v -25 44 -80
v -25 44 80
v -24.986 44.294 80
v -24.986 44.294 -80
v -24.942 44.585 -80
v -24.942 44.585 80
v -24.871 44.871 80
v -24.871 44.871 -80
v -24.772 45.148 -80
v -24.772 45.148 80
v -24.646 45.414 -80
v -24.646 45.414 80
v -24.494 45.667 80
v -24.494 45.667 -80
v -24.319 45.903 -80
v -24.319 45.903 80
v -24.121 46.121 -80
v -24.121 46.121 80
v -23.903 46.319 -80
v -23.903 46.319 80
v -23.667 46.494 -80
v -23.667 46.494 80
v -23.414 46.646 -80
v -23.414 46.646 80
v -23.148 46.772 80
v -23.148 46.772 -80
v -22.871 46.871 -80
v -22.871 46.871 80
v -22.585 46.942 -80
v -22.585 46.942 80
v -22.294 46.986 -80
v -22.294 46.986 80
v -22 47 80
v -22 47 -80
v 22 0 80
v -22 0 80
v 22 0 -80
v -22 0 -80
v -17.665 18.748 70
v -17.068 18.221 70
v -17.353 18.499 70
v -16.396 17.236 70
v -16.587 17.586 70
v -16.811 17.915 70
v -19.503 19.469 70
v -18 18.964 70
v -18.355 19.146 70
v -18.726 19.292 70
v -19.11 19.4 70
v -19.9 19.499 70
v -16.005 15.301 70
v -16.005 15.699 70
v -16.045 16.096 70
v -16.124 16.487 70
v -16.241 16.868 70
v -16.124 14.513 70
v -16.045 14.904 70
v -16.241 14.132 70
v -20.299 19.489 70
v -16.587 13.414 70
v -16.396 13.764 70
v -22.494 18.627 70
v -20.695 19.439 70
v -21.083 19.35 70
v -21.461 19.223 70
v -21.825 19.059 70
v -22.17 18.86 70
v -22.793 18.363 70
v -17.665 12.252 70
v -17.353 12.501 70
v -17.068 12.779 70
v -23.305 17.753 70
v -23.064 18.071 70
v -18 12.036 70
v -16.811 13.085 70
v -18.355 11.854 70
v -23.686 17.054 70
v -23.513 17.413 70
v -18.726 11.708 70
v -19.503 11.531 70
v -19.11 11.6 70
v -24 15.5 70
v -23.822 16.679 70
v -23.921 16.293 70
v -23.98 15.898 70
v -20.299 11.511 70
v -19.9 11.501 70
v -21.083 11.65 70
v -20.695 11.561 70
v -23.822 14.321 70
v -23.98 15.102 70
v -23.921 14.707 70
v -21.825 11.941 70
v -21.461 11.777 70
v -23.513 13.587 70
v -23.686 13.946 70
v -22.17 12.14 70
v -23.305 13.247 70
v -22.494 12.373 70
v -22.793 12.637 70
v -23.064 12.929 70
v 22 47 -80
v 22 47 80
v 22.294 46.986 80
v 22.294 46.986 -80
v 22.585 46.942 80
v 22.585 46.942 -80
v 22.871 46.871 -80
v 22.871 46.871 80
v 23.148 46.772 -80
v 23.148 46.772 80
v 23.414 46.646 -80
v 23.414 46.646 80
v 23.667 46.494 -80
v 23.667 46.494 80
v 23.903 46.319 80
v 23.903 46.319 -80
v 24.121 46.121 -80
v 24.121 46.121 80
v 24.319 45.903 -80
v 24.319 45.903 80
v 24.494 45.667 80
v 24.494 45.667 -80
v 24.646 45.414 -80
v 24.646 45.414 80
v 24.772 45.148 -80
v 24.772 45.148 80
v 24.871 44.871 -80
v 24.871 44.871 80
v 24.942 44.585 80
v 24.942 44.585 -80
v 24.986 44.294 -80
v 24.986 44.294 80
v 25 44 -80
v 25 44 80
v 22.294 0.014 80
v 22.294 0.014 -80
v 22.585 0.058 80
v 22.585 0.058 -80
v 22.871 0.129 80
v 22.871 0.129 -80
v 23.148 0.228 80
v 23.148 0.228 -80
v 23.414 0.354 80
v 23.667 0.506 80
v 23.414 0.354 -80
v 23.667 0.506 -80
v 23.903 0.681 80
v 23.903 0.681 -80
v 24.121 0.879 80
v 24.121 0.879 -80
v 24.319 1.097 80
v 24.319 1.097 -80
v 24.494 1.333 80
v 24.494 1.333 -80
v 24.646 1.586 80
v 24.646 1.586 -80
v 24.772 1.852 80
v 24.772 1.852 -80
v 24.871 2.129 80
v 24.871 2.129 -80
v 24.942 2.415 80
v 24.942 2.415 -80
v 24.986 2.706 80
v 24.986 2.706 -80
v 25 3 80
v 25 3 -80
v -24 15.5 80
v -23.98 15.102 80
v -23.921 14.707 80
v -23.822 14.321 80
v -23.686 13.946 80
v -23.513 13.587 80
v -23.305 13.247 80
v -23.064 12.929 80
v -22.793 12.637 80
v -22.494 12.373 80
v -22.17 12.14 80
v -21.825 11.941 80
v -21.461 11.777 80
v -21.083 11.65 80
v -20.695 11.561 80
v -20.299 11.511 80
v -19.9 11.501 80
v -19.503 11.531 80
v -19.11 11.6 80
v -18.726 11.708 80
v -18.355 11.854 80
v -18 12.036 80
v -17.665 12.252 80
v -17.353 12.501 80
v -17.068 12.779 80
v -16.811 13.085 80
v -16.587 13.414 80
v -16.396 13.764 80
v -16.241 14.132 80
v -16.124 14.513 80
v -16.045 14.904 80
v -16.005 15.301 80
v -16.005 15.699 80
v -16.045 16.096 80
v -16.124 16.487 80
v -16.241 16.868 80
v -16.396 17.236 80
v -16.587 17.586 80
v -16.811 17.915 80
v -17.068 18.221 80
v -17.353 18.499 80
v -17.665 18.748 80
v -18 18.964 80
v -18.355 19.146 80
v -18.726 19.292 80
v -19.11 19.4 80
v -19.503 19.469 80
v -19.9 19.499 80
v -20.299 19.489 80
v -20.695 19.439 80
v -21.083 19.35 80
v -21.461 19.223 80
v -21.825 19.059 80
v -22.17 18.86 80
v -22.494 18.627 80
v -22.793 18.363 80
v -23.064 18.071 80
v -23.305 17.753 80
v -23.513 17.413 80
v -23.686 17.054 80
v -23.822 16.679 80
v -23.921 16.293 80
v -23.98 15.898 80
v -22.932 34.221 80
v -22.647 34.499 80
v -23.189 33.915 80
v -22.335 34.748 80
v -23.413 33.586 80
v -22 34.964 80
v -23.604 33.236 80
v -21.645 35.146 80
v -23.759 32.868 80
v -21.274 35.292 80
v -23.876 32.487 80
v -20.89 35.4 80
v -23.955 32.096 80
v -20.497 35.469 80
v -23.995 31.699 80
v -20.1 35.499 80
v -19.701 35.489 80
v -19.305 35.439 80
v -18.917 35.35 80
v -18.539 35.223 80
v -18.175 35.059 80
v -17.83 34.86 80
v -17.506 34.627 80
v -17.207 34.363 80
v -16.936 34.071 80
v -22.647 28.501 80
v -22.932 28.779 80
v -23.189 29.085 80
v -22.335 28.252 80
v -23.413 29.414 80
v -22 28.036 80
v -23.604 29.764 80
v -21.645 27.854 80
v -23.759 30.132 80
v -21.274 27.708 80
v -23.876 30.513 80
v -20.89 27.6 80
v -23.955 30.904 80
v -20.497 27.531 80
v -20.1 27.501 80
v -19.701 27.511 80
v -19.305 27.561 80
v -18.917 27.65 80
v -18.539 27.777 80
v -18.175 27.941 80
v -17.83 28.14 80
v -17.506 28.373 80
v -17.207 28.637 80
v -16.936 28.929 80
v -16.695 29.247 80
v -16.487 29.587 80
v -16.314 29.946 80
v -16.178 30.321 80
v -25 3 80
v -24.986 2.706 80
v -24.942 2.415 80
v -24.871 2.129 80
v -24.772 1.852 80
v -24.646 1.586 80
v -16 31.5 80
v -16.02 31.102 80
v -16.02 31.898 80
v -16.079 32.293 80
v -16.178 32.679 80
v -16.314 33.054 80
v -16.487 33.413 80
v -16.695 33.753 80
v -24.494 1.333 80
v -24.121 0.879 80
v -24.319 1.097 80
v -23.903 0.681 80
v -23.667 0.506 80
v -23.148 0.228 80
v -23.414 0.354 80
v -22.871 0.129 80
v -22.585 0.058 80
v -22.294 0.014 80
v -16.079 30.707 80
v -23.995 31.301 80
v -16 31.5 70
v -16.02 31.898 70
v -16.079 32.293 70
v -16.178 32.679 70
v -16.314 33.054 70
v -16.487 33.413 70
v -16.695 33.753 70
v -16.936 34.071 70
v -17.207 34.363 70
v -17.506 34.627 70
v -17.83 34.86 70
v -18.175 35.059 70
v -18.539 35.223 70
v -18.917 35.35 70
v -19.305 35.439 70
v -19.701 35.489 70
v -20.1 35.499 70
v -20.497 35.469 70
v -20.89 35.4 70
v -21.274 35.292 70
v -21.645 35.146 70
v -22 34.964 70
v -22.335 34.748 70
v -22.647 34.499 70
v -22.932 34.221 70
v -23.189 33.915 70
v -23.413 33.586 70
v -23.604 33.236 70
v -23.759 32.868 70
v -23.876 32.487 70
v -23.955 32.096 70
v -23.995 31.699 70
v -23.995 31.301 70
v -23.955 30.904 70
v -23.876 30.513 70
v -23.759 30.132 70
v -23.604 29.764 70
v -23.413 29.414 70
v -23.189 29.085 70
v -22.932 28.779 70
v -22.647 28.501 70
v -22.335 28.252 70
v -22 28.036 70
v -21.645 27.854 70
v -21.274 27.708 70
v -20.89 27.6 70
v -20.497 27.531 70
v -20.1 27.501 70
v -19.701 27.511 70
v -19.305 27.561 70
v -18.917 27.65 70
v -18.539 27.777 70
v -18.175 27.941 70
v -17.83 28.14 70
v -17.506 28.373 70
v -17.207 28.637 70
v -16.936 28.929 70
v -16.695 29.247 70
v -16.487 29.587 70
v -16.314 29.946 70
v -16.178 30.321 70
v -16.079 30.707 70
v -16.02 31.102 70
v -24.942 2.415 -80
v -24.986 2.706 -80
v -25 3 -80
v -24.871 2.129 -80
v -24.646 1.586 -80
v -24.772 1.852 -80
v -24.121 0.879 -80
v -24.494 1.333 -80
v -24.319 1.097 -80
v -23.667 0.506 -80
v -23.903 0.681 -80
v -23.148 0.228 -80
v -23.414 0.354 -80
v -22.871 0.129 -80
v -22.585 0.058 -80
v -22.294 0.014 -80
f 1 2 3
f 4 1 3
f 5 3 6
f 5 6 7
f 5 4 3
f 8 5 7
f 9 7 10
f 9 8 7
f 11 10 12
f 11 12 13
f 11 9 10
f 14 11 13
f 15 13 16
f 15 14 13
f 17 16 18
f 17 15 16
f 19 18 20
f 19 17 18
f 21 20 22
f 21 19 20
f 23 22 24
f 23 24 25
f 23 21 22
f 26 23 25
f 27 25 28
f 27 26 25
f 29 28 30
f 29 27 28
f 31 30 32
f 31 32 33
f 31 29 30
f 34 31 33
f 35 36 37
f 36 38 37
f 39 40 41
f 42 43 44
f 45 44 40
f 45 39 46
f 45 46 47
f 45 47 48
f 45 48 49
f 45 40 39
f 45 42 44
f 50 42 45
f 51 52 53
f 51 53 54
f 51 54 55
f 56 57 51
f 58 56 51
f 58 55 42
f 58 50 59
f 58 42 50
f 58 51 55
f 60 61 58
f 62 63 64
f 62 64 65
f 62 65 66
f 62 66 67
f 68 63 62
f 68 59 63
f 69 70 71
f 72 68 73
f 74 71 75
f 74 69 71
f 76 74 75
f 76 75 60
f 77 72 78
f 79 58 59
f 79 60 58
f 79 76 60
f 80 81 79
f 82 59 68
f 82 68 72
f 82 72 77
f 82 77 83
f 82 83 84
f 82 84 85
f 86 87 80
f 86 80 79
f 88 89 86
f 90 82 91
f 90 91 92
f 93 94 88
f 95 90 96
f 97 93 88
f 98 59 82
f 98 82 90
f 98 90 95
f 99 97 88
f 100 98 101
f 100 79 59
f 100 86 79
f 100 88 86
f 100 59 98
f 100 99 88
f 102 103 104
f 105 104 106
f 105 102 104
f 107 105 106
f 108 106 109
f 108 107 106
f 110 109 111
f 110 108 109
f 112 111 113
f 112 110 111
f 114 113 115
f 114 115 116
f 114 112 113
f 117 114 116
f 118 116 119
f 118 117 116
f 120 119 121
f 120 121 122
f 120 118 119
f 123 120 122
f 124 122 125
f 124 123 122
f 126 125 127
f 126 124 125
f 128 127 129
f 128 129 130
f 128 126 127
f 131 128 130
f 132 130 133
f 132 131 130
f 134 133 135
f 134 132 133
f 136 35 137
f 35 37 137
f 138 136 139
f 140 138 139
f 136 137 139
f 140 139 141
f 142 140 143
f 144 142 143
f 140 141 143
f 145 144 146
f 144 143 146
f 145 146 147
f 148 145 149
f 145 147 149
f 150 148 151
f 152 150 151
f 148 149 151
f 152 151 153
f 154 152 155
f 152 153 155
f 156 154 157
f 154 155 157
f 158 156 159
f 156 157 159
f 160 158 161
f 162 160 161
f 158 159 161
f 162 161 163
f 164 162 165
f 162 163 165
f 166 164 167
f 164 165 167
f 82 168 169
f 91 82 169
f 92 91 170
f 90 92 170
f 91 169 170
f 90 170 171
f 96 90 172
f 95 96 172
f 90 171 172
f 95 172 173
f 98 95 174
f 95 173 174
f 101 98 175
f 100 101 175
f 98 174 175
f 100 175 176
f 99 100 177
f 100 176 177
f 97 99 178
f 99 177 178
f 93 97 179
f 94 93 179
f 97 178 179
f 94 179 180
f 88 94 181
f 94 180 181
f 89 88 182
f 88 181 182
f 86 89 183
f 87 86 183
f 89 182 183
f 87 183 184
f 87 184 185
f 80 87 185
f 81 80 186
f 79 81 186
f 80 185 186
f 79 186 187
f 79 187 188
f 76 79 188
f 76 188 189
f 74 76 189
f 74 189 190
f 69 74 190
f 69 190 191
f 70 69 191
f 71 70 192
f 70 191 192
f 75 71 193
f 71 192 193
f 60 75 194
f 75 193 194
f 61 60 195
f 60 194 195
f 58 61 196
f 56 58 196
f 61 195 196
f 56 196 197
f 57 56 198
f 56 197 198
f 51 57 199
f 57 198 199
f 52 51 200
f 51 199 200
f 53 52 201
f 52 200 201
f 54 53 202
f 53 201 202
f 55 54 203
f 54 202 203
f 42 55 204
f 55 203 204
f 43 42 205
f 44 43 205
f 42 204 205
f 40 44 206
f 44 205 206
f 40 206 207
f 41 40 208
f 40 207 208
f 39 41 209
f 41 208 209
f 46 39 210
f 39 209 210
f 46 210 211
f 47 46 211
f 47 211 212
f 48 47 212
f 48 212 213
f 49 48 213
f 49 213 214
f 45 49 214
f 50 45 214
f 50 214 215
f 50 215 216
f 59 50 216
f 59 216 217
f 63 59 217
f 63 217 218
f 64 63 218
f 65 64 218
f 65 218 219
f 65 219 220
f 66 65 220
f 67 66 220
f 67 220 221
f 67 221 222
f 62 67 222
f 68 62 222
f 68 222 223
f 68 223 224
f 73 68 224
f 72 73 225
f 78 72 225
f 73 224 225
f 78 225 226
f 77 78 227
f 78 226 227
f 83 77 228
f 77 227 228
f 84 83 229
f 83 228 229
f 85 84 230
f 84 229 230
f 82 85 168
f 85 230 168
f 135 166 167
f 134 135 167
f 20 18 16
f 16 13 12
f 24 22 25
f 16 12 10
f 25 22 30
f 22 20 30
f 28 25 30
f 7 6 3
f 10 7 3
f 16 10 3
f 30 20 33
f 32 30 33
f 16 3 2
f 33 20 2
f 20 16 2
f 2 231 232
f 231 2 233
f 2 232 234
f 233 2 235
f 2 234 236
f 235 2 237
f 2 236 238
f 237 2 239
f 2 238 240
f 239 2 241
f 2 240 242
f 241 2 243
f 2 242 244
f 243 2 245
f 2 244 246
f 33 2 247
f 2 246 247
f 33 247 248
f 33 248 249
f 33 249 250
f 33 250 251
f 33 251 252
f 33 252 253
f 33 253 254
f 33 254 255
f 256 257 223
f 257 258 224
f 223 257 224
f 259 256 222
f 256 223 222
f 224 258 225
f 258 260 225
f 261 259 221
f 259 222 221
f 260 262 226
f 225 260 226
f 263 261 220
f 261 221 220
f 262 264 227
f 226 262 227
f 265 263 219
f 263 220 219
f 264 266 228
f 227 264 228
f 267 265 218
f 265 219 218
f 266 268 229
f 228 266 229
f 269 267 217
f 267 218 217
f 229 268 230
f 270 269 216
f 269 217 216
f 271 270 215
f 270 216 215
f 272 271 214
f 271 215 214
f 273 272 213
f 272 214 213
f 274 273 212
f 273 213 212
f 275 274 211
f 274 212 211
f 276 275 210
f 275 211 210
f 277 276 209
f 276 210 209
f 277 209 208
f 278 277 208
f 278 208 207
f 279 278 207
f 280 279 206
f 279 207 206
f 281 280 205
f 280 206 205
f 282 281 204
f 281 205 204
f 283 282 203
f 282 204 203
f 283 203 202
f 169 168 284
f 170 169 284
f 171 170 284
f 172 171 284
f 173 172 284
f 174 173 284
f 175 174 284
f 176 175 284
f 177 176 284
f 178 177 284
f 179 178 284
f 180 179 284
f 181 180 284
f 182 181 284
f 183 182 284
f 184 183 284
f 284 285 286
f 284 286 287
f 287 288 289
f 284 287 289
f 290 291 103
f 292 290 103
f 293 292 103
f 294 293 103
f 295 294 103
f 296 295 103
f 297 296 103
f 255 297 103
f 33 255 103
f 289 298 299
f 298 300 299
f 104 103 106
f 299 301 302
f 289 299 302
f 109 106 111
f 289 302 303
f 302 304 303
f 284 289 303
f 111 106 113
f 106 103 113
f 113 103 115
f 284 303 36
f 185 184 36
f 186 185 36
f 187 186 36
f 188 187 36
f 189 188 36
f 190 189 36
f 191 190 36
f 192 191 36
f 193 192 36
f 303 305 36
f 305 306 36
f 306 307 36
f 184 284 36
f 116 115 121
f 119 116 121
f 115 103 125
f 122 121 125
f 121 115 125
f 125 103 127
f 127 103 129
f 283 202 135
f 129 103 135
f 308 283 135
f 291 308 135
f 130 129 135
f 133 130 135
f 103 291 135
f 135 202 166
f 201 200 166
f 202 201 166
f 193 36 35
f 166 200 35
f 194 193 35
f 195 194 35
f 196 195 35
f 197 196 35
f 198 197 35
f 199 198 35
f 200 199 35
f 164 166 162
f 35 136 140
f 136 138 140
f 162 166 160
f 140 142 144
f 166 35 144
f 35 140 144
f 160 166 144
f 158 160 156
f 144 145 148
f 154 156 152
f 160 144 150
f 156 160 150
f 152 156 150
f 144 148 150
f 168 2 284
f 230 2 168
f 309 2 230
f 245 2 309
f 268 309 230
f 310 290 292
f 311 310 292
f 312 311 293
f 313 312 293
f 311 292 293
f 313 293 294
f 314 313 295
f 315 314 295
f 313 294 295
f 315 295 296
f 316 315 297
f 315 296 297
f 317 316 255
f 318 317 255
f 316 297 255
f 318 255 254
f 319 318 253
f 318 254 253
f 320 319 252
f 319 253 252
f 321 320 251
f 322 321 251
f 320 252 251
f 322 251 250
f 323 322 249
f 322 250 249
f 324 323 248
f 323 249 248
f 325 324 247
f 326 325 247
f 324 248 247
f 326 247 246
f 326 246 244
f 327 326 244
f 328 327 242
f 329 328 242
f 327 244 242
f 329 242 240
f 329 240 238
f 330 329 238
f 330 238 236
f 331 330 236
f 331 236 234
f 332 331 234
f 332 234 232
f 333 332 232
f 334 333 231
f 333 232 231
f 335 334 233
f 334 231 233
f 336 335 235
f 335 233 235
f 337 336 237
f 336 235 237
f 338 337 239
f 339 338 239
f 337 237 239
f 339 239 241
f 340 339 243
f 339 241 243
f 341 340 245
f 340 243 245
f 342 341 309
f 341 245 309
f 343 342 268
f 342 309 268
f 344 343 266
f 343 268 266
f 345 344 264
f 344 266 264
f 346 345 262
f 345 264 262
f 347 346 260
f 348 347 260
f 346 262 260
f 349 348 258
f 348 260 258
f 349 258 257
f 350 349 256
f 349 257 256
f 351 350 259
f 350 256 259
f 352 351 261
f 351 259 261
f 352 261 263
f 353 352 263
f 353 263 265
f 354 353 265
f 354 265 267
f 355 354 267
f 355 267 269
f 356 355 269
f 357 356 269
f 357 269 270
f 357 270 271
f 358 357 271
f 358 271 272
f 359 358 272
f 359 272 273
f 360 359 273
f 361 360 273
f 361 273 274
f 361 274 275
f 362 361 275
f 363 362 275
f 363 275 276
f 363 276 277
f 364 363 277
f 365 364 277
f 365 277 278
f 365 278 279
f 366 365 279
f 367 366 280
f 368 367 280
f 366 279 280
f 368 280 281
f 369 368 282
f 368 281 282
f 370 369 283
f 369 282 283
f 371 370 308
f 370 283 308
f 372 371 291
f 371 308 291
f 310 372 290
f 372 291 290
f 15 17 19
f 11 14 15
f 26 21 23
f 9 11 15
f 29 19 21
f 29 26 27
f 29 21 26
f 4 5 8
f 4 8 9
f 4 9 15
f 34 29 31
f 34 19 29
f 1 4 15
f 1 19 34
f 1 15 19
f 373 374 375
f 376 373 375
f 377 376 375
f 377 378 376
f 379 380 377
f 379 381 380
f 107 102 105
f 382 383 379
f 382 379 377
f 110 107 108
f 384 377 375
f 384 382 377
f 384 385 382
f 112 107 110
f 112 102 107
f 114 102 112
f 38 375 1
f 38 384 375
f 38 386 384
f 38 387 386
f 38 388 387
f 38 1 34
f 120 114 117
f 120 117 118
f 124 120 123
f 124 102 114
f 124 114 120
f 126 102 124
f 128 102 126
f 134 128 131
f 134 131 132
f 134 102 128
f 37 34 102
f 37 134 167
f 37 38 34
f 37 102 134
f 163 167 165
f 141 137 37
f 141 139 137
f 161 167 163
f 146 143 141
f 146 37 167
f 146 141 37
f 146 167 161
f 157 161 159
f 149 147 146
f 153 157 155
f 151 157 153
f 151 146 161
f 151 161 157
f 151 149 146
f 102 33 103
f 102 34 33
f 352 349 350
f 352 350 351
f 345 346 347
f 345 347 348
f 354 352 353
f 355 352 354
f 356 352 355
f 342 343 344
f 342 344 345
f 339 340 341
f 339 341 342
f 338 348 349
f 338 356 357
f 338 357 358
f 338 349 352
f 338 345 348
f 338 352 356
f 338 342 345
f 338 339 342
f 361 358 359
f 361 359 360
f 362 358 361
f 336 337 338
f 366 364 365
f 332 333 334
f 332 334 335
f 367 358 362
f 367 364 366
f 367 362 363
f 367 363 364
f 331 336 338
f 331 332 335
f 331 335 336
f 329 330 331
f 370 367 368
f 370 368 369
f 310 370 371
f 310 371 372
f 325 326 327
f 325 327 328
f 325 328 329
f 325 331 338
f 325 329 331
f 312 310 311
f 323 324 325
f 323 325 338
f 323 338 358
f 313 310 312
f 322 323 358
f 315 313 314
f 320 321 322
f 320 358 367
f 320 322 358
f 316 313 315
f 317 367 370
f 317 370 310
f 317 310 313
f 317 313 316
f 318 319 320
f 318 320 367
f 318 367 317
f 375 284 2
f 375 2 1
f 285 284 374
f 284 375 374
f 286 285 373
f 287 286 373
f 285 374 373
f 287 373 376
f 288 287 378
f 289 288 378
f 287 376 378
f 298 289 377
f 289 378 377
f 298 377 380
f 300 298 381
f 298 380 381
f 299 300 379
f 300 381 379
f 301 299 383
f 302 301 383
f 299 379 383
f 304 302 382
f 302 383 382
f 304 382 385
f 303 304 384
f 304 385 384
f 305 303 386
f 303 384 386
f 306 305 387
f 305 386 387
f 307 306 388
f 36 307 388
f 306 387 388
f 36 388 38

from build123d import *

# Parameters (mm, degrees)
SKETCH1_W           = 50
SKETCH1_H           = 160
BOSS_EXTRUDE1_DEPTH = 47
SKETCH2_R           = 4
CUT_EXTRUDE1_DEPTH  = 10
FILLET1_R           = 3


with BuildPart() as part:
    # Sketch1 → Boss-Extrude1 (new body)
    with BuildSketch(Plane(origin=(0, 0, 0), x_dir=(1, 0, 0), z_dir=(0, 1, 0))):
        Rectangle(SKETCH1_W, SKETCH1_H)
    extrude(amount=BOSS_EXTRUDE1_DEPTH)

    # Sketch2 → Cut-Extrude1 (cut)
    with BuildSketch(Plane.XY.offset(80)):
        with Locations((-20, 31.5)):
            Circle(SKETCH2_R)
        with Locations(Location((-20, 15.5, 0), (0, 0, 180))):
            Circle(SKETCH2_R)
    extrude(amount=-CUT_EXTRUDE1_DEPTH, mode=Mode.SUBTRACT)

    # Fillet1
    fillet1_edges = [part.edges().sort_by_distance(p)[0] for p in [
        (-25, 47, 0),
        (25, 47, 0),
        (-25, 0, 0),
        (25, 0, 0),
    ]]
    fillet(fillet1_edges, radius=FILLET1_R)


solid = part.part
